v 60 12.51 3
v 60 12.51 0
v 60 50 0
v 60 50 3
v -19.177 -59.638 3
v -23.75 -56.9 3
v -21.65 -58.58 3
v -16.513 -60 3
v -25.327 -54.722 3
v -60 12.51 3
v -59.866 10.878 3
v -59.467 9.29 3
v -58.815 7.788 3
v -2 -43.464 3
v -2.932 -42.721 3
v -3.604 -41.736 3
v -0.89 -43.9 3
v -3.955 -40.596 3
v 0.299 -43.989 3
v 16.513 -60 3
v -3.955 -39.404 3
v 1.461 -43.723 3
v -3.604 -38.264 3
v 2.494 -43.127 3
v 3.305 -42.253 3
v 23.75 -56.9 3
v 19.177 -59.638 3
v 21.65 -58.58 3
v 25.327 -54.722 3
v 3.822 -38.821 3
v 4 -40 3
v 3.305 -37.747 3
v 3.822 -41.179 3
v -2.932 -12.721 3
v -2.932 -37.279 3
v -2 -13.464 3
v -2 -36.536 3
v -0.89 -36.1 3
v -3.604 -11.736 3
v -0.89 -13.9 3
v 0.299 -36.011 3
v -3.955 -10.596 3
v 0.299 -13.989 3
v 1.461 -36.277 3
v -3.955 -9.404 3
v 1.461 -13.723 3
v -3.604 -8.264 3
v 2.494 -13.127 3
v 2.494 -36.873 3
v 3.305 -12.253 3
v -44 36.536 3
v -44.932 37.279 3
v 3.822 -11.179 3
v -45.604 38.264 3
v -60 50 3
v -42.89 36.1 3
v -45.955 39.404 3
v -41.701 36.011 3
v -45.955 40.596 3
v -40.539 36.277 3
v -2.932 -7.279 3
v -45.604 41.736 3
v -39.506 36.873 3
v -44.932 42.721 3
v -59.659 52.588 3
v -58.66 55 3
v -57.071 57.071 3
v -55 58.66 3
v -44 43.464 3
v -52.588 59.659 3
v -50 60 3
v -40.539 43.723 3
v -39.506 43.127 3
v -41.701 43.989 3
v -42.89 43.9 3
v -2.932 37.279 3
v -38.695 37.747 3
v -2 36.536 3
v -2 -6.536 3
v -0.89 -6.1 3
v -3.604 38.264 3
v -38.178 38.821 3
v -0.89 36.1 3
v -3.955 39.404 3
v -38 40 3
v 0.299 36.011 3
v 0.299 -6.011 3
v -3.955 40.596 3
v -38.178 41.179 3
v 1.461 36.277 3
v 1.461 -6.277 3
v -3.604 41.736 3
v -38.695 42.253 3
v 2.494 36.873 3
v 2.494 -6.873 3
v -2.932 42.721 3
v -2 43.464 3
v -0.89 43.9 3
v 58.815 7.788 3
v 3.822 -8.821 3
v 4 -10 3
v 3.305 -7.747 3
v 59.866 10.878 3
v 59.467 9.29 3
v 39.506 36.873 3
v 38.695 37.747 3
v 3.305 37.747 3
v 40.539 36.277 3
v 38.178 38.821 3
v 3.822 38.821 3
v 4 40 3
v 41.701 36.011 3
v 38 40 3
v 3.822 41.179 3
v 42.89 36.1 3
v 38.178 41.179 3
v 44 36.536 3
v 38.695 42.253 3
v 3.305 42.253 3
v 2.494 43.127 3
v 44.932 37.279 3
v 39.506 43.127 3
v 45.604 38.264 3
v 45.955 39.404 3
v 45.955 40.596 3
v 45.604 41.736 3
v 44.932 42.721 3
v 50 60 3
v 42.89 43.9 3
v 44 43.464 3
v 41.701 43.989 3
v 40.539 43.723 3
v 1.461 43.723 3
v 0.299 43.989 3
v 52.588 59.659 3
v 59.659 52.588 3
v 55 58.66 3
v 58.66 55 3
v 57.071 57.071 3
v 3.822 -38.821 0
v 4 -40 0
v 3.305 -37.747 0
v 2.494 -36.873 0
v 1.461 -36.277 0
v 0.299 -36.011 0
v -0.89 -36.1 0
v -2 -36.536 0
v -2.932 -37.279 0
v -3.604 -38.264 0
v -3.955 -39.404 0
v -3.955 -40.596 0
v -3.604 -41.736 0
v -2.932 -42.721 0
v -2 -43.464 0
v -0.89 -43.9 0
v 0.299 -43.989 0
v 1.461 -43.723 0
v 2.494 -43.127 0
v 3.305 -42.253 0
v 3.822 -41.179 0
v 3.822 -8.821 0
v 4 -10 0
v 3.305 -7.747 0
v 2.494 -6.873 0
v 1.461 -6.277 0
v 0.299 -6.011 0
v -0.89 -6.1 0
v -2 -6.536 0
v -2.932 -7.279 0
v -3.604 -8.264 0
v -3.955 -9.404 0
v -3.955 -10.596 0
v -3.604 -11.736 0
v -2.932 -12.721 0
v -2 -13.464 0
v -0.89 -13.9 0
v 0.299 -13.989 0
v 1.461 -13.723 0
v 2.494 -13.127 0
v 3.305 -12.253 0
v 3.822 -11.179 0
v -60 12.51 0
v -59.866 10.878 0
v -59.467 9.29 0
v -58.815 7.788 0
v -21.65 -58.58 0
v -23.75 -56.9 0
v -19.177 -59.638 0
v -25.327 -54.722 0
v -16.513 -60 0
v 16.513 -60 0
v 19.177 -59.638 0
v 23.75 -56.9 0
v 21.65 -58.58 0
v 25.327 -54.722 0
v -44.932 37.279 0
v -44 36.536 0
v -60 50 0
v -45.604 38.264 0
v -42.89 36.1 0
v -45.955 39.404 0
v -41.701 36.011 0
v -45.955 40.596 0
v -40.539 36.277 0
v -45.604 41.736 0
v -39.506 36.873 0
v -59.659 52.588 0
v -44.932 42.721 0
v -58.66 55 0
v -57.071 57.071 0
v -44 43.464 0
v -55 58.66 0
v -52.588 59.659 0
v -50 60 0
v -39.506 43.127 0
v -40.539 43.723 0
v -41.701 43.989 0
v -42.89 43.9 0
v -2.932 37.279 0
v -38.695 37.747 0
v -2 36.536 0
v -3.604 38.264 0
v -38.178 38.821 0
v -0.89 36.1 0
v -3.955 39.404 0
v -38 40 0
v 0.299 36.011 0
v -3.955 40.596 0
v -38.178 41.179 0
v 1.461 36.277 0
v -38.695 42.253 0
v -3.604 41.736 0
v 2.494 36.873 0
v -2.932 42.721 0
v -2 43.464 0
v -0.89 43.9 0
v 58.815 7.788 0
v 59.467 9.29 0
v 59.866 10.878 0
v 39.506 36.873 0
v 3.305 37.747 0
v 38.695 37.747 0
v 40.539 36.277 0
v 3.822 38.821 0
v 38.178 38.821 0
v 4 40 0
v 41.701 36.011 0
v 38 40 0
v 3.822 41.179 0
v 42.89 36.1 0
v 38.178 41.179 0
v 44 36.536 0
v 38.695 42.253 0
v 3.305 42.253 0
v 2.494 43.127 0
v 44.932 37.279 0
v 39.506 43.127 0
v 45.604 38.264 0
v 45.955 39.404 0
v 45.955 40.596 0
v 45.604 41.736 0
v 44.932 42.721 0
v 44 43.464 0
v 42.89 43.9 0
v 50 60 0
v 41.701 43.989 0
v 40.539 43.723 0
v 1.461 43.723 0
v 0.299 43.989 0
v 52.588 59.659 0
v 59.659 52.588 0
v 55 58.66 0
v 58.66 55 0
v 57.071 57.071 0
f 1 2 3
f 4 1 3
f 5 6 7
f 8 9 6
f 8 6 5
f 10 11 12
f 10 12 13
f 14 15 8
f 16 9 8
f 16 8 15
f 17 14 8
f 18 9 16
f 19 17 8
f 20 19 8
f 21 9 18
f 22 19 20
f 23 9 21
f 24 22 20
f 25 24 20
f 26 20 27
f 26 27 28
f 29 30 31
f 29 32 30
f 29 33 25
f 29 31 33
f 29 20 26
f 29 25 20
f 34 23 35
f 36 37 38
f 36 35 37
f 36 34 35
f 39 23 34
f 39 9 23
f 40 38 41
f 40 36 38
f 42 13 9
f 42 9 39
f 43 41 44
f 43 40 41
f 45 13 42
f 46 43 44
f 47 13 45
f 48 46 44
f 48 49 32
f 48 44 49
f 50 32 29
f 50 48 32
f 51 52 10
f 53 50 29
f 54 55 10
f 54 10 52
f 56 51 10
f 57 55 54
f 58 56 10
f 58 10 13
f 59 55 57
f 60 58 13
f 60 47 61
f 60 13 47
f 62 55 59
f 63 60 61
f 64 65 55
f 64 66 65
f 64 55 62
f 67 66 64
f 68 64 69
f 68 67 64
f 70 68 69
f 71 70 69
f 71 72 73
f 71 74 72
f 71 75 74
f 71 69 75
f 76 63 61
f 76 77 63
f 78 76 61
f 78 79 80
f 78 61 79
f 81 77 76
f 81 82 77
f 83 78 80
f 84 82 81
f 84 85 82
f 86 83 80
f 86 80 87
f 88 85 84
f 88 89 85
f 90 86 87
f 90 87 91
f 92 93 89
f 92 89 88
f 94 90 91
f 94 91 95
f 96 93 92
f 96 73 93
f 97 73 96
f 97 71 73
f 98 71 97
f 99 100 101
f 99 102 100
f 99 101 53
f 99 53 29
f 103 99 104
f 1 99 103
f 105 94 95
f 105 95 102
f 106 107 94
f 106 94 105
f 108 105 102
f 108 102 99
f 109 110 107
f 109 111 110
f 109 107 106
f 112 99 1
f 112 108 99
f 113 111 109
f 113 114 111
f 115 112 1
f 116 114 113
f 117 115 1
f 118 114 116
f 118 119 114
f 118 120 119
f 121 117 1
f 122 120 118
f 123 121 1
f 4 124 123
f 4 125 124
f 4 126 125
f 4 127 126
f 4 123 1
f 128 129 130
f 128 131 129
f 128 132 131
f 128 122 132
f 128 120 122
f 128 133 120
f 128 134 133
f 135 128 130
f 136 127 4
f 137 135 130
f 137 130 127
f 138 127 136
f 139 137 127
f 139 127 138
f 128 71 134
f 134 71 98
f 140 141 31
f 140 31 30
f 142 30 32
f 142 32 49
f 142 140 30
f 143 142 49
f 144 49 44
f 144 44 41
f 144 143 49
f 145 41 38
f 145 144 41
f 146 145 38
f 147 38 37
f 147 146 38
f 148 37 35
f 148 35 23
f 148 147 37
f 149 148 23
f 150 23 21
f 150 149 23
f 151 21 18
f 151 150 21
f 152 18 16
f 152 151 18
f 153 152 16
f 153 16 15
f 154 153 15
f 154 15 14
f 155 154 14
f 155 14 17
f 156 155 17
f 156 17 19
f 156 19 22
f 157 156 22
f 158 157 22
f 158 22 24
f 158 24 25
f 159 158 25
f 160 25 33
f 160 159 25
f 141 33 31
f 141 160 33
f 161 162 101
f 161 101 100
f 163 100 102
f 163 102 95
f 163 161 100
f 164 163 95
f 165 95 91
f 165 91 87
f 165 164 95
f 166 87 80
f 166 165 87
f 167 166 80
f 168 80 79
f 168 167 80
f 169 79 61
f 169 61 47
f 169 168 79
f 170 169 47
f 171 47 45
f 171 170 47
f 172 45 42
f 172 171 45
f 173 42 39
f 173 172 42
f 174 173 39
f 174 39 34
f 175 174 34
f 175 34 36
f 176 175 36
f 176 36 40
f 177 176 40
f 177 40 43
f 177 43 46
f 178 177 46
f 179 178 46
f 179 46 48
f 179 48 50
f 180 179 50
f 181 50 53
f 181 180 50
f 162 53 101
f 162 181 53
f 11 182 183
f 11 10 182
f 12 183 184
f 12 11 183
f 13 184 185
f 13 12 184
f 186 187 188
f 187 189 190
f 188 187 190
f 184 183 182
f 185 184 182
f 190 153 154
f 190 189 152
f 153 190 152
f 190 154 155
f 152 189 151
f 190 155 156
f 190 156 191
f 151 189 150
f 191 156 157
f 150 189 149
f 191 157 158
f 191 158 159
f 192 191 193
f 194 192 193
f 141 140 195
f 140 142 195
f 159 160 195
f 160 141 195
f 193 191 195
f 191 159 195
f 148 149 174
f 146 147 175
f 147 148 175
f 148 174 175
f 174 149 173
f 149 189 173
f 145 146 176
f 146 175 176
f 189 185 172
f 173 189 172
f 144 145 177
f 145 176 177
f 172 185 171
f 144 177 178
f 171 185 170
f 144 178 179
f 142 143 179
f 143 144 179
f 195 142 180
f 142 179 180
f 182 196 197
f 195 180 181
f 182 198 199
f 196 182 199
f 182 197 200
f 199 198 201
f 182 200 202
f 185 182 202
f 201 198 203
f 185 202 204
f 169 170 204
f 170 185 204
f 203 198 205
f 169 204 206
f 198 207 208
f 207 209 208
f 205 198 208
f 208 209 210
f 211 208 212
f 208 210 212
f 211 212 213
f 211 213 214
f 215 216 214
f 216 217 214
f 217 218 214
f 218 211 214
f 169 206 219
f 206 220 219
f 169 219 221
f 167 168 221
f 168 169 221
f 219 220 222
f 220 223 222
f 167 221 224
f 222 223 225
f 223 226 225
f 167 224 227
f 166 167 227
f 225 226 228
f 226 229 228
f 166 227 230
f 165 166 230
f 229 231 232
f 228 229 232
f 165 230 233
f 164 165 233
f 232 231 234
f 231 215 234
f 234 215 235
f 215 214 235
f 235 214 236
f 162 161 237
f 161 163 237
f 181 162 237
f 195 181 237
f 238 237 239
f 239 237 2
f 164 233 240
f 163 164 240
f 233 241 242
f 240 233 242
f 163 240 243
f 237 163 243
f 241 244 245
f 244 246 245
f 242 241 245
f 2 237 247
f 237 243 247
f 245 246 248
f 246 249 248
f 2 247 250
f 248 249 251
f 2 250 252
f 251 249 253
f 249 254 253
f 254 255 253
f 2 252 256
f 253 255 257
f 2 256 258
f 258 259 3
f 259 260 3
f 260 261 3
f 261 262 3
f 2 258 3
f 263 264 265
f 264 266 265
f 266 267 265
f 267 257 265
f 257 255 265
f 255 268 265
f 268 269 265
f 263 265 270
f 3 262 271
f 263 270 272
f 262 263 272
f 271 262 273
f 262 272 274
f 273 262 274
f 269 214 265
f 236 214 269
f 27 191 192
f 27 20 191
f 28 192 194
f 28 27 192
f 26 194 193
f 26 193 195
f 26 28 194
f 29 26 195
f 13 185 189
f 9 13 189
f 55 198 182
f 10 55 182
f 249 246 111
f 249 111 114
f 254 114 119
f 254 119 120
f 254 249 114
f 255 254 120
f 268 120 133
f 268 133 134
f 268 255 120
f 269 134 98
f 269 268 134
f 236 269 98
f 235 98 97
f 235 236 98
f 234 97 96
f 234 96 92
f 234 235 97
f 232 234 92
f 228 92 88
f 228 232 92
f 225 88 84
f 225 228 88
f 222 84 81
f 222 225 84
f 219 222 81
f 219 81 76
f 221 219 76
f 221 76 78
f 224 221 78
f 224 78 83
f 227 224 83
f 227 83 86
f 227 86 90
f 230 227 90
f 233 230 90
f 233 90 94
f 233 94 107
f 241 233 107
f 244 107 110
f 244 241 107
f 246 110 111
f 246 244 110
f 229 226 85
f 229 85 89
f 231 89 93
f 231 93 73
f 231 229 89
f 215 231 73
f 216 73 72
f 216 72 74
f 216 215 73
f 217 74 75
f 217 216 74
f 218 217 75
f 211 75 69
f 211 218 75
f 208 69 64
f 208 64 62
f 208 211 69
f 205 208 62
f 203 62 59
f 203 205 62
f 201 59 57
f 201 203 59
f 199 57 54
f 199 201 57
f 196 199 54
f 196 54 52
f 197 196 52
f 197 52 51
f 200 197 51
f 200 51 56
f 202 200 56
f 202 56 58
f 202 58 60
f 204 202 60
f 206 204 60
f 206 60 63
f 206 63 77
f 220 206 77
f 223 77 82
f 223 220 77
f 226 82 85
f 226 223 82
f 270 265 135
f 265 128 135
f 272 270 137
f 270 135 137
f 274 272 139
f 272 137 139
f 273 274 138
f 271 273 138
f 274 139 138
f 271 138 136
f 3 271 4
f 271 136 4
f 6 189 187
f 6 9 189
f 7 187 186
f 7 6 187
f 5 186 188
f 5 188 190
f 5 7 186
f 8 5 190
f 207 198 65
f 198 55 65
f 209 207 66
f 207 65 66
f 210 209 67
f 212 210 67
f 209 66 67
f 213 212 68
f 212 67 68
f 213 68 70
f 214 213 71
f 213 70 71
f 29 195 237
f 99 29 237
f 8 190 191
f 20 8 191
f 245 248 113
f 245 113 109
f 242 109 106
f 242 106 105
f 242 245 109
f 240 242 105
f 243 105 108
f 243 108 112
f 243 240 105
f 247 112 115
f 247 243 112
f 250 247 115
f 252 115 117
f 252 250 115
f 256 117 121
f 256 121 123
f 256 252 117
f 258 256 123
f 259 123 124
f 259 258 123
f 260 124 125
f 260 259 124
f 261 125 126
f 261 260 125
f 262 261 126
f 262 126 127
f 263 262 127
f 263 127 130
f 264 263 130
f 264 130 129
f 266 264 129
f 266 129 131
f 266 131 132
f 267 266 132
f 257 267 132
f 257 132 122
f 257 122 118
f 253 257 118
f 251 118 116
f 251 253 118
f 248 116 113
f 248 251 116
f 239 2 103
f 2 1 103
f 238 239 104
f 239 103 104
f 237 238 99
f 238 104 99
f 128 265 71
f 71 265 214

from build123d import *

# Parameters (mm, degrees)
SKETCH1_R           = 4
BOSS_EXTRUDE1_DEPTH = 3
FILLET1_R           = 10


with BuildPart() as part:
    # Sketch1 → Boss-Extrude1 (new body)
    with BuildSketch(Plane.XY):
        Polygon((-60, 60), (-60, 10), (-22.5, -60), (22.5, -60), (60, 10), (60, 60), align=None)
        with Locations((-42, 40)):
            Circle(SKETCH1_R, mode=Mode.SUBTRACT)
        with Locations((0, -40)):
            Circle(SKETCH1_R, mode=Mode.SUBTRACT)
        with Locations((0, -10)):
            Circle(SKETCH1_R, mode=Mode.SUBTRACT)
        with Locations((0, 40)):
            Circle(SKETCH1_R, mode=Mode.SUBTRACT)
        with Locations((42, 40)):
            Circle(SKETCH1_R, mode=Mode.SUBTRACT)
    extrude(amount=BOSS_EXTRUDE1_DEPTH)

    # Fillet1
    fillet1_edges = [part.edges().sort_by_distance(p)[0] for p in [
        (60, 60, 1.5),
        (60, 10, 1.5),
        (22.5, -60, 1.5),
        (-22.5, -60, 1.5),
        (-60, 10, 1.5),
        (-60, 60, 1.5),
    ]]
    fillet(fillet1_edges, radius=FILLET1_R)


solid = part.part
